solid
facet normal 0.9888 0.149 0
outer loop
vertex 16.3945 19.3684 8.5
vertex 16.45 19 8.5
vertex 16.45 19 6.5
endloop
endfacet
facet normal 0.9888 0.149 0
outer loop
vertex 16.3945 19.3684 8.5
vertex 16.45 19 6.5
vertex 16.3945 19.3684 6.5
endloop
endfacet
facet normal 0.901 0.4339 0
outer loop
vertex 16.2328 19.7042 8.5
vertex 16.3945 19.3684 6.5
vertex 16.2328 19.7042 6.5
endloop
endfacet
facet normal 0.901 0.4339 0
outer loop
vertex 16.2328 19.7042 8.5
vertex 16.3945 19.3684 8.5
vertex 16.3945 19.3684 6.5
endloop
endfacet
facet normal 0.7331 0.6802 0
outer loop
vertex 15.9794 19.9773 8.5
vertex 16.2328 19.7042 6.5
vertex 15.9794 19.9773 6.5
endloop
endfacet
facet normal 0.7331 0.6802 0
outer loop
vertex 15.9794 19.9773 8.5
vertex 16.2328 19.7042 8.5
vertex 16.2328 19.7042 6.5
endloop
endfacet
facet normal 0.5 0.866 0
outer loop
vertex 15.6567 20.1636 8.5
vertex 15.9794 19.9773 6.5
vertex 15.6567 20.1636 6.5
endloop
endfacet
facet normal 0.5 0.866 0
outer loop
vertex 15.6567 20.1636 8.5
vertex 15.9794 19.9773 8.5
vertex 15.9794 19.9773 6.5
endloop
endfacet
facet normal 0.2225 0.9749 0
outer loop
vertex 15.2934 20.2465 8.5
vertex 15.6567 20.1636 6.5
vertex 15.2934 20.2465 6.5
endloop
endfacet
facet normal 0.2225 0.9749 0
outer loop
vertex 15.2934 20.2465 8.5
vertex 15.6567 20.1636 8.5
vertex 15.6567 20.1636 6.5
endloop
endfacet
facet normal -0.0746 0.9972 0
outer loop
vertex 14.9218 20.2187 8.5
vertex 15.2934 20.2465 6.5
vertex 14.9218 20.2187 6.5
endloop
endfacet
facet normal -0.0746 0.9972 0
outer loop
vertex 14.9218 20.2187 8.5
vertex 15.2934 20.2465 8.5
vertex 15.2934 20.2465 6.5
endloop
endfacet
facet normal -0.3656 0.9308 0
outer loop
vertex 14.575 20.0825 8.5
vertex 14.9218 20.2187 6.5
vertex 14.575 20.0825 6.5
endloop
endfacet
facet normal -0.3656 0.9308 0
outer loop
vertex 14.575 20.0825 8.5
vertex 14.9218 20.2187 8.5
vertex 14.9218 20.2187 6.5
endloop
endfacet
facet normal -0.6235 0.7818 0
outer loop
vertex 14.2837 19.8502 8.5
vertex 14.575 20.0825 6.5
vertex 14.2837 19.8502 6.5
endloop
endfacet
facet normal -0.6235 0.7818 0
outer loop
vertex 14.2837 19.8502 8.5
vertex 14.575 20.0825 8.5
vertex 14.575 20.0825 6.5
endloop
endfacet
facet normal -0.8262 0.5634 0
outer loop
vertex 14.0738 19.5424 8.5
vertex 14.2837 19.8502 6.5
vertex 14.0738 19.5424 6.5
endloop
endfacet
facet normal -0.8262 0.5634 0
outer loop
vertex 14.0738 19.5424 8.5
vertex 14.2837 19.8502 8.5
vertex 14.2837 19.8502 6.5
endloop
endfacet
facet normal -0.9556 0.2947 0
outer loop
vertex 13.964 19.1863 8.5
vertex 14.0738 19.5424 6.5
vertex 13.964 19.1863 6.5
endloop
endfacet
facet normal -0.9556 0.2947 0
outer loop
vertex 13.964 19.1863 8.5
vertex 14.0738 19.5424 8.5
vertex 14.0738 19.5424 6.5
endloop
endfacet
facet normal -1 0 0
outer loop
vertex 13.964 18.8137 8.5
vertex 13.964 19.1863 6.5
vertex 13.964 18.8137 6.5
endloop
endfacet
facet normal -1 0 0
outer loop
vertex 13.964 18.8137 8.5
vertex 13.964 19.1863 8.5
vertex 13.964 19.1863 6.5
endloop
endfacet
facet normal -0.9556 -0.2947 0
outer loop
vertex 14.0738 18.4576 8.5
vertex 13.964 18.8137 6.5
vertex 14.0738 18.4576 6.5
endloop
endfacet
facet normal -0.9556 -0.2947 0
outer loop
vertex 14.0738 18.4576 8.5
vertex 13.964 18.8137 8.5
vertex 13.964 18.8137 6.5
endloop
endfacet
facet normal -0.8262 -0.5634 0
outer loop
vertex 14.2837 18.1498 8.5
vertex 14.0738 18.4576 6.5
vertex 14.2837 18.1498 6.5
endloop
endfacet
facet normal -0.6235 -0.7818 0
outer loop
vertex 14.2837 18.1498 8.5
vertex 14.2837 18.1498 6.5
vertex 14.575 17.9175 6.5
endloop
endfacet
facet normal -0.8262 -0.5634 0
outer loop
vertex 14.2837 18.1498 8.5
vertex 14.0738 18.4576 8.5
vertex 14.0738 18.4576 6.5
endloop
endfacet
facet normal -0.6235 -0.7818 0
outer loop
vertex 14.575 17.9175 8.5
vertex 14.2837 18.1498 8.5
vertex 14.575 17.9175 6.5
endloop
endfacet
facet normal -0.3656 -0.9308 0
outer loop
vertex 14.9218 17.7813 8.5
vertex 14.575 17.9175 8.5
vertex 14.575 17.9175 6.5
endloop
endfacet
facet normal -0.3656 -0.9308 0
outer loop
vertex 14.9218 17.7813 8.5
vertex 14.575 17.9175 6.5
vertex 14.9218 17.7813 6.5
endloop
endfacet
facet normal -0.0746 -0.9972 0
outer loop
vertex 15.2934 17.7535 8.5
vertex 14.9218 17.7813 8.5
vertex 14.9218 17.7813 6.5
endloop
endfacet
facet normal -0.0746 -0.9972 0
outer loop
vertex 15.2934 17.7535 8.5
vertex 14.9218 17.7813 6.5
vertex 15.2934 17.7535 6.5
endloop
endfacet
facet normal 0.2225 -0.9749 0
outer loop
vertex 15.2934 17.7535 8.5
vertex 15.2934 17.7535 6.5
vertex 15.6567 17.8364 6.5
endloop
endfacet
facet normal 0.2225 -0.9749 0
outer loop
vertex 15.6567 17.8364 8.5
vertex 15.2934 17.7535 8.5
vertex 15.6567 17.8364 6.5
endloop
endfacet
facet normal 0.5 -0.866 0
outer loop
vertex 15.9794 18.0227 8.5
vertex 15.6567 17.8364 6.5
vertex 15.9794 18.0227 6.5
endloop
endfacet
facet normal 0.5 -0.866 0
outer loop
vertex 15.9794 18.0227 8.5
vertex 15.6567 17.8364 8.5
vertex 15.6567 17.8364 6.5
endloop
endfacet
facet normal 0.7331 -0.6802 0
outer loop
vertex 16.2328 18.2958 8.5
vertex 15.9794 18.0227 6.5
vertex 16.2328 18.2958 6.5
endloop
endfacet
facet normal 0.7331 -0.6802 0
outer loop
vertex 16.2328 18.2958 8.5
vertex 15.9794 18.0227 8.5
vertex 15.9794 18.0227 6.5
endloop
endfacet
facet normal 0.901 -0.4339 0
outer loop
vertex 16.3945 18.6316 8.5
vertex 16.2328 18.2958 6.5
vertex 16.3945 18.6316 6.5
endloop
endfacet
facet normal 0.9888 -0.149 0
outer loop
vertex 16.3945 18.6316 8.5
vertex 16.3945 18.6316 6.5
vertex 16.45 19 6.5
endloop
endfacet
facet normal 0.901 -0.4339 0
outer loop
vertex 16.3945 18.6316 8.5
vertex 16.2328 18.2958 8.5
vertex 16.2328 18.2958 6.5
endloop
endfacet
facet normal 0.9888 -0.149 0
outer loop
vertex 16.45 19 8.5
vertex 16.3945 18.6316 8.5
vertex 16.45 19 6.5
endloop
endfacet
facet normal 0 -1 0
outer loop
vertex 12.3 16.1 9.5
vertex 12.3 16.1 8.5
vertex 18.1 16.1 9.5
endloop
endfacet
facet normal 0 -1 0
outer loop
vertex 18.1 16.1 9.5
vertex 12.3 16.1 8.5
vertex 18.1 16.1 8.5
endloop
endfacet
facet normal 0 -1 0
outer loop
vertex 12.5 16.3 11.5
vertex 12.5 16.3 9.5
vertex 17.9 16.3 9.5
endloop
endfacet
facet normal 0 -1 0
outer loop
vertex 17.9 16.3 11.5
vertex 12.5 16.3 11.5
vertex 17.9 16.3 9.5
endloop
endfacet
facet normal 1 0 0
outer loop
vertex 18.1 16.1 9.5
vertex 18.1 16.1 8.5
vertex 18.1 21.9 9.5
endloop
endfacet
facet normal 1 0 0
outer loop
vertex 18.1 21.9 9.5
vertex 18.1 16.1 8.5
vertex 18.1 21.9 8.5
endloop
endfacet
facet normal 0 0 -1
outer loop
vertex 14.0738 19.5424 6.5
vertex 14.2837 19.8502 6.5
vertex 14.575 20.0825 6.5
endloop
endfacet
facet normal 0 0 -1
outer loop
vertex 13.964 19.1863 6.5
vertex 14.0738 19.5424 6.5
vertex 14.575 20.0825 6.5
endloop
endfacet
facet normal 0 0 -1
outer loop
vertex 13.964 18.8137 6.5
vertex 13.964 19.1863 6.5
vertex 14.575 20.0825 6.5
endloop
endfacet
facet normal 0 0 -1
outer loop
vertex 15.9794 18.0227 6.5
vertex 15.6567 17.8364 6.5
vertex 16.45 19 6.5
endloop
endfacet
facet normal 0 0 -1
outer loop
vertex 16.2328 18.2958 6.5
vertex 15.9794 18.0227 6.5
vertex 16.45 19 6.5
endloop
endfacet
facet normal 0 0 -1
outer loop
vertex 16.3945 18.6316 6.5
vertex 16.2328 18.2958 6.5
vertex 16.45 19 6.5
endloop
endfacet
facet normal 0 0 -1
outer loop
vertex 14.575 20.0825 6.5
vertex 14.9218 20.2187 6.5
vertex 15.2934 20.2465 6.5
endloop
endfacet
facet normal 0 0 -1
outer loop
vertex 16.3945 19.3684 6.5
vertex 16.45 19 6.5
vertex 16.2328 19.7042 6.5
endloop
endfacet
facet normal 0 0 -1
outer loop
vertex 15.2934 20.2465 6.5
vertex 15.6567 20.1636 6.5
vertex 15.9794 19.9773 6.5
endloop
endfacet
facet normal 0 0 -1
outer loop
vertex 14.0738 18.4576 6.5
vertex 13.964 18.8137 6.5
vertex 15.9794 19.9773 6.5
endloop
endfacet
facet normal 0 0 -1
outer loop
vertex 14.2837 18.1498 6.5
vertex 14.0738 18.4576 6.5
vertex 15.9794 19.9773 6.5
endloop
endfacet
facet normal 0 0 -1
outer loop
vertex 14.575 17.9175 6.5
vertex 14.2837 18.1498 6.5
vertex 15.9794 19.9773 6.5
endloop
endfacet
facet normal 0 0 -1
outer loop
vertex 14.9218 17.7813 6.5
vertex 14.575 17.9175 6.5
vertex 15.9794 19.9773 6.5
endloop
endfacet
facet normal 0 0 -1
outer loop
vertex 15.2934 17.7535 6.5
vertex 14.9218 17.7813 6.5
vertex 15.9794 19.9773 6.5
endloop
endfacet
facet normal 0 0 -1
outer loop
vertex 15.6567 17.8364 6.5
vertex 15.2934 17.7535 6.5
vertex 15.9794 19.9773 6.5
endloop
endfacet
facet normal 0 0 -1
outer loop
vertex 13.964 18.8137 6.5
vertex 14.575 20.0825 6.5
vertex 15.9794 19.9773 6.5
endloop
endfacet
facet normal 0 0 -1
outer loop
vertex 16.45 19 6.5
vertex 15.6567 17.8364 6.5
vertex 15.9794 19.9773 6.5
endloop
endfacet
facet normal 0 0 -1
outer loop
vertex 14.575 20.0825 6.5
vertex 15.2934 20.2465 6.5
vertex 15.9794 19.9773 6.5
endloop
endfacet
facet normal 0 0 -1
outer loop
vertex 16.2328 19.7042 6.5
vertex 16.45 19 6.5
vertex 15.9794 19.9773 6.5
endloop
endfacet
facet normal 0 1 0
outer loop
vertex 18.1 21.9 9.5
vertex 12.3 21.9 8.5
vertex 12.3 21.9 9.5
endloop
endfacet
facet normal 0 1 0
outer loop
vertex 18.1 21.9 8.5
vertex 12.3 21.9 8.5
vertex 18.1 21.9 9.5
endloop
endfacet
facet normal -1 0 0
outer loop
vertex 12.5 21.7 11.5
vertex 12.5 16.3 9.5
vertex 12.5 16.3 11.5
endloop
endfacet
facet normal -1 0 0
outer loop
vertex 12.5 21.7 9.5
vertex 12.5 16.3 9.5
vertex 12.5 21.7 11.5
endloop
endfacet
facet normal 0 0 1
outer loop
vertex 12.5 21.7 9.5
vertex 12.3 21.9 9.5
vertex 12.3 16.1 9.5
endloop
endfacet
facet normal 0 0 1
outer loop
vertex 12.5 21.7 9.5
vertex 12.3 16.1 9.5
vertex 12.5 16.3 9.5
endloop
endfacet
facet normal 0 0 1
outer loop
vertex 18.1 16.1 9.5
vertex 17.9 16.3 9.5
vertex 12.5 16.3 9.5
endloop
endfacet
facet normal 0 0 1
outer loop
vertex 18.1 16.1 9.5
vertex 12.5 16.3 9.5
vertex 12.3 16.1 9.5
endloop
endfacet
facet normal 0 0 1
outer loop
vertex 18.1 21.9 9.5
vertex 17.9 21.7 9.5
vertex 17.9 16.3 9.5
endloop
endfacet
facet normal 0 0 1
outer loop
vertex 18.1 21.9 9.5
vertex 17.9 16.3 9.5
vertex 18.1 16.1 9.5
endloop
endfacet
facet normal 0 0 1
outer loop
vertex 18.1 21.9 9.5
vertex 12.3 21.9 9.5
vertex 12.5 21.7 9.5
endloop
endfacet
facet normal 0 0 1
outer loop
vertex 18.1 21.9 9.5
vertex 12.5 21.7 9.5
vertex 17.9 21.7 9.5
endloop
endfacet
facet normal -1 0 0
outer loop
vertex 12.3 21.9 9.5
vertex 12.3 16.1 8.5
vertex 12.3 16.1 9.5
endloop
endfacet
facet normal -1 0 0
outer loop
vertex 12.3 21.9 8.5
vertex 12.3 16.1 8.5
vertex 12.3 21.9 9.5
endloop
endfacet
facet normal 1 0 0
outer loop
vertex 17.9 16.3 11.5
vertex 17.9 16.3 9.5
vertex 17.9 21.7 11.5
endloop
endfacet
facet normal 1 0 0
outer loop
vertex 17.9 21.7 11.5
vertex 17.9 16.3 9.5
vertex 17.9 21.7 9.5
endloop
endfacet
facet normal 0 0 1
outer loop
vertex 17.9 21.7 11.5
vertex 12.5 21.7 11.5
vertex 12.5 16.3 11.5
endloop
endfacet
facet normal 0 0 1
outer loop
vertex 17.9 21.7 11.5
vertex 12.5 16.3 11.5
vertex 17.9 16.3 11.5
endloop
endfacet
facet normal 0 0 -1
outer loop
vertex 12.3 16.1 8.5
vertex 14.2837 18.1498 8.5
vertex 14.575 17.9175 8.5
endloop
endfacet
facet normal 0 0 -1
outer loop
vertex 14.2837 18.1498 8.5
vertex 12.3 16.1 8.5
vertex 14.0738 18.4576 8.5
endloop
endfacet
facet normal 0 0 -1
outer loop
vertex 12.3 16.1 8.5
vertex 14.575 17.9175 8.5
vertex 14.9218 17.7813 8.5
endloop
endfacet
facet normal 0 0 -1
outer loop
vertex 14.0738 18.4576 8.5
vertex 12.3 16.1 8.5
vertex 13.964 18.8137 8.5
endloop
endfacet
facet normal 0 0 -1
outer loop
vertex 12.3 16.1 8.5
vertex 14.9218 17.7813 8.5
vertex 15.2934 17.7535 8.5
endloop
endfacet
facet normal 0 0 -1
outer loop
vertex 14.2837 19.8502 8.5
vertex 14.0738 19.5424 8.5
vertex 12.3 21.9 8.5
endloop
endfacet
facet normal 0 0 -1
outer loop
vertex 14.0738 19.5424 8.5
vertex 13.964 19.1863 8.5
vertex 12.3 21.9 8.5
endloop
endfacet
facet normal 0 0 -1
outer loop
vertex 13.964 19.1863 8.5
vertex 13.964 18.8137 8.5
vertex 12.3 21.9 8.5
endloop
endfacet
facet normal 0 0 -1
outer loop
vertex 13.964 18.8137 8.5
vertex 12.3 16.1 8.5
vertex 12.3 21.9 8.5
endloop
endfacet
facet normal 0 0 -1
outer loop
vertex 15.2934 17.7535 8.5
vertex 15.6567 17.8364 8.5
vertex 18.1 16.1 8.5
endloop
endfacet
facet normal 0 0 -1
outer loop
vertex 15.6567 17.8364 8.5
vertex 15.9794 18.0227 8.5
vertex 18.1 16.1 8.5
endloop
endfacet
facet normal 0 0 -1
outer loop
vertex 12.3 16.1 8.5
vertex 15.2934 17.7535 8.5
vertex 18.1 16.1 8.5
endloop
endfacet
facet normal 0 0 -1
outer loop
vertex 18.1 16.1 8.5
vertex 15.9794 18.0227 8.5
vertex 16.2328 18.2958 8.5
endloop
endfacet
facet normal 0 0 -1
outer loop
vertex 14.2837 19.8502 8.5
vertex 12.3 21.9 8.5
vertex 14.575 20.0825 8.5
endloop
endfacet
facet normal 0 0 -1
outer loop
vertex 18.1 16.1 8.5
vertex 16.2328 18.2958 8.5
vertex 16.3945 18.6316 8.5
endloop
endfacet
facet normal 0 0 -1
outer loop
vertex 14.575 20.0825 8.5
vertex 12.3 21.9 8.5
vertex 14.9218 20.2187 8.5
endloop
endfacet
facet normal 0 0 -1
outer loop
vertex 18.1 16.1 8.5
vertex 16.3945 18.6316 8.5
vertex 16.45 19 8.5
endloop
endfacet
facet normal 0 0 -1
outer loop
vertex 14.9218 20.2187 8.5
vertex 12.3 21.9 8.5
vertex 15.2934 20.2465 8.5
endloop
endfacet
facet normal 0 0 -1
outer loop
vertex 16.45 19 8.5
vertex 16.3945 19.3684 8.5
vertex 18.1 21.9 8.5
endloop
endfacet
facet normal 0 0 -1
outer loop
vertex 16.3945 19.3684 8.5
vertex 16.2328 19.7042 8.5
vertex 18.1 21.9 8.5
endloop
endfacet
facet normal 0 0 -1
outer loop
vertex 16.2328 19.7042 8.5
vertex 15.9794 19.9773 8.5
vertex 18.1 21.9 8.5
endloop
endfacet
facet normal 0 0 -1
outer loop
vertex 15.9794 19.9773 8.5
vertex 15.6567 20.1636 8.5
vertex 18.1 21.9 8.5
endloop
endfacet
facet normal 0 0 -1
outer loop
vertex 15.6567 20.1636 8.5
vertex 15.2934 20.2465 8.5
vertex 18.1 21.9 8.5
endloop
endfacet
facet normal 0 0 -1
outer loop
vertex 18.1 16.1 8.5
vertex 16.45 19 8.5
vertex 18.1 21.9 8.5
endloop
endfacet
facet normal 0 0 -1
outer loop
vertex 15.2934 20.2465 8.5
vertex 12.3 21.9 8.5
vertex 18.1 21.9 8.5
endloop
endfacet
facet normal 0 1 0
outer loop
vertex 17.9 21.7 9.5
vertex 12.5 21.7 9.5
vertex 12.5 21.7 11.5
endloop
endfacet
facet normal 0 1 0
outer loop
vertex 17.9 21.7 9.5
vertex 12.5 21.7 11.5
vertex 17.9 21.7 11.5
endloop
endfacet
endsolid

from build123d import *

# Parameters (mm, degrees)
SKETCH006_W  = 5.4
SKETCH006_H  = 5.4
PAD003_DEPTH = 3
SKETCH007_W  = 5.8
SKETCH007_H  = 5.8
PAD004_DEPTH = 1
SKETCH008_R  = 1.25
PAD005_DEPTH = 2


with BuildPart() as part:
    # Sketch006 → Pad003 (new body)
    with BuildSketch(Plane.XY):
        with Locations((15.2, 19)):
            Rectangle(SKETCH006_W, SKETCH006_H)
    extrude(amount=PAD003_DEPTH)

    # Sketch007 → Pad004 (join)
    with BuildSketch(Plane.XY):
        with Locations((15.2, 19)):
            Rectangle(SKETCH007_W, SKETCH007_H)
    extrude(amount=PAD004_DEPTH)

    # Sketch008 → Pad005 (join)
    with BuildSketch(Plane.XY):
        with Locations((15.2, 19)):
            Circle(SKETCH008_R)
    extrude(amount=-PAD005_DEPTH)


with BuildPart() as part_1:
    # Body003 placement: moved
    add(part.part.moved(Location((0, 0, 8.5))))


solid = part_1.part
